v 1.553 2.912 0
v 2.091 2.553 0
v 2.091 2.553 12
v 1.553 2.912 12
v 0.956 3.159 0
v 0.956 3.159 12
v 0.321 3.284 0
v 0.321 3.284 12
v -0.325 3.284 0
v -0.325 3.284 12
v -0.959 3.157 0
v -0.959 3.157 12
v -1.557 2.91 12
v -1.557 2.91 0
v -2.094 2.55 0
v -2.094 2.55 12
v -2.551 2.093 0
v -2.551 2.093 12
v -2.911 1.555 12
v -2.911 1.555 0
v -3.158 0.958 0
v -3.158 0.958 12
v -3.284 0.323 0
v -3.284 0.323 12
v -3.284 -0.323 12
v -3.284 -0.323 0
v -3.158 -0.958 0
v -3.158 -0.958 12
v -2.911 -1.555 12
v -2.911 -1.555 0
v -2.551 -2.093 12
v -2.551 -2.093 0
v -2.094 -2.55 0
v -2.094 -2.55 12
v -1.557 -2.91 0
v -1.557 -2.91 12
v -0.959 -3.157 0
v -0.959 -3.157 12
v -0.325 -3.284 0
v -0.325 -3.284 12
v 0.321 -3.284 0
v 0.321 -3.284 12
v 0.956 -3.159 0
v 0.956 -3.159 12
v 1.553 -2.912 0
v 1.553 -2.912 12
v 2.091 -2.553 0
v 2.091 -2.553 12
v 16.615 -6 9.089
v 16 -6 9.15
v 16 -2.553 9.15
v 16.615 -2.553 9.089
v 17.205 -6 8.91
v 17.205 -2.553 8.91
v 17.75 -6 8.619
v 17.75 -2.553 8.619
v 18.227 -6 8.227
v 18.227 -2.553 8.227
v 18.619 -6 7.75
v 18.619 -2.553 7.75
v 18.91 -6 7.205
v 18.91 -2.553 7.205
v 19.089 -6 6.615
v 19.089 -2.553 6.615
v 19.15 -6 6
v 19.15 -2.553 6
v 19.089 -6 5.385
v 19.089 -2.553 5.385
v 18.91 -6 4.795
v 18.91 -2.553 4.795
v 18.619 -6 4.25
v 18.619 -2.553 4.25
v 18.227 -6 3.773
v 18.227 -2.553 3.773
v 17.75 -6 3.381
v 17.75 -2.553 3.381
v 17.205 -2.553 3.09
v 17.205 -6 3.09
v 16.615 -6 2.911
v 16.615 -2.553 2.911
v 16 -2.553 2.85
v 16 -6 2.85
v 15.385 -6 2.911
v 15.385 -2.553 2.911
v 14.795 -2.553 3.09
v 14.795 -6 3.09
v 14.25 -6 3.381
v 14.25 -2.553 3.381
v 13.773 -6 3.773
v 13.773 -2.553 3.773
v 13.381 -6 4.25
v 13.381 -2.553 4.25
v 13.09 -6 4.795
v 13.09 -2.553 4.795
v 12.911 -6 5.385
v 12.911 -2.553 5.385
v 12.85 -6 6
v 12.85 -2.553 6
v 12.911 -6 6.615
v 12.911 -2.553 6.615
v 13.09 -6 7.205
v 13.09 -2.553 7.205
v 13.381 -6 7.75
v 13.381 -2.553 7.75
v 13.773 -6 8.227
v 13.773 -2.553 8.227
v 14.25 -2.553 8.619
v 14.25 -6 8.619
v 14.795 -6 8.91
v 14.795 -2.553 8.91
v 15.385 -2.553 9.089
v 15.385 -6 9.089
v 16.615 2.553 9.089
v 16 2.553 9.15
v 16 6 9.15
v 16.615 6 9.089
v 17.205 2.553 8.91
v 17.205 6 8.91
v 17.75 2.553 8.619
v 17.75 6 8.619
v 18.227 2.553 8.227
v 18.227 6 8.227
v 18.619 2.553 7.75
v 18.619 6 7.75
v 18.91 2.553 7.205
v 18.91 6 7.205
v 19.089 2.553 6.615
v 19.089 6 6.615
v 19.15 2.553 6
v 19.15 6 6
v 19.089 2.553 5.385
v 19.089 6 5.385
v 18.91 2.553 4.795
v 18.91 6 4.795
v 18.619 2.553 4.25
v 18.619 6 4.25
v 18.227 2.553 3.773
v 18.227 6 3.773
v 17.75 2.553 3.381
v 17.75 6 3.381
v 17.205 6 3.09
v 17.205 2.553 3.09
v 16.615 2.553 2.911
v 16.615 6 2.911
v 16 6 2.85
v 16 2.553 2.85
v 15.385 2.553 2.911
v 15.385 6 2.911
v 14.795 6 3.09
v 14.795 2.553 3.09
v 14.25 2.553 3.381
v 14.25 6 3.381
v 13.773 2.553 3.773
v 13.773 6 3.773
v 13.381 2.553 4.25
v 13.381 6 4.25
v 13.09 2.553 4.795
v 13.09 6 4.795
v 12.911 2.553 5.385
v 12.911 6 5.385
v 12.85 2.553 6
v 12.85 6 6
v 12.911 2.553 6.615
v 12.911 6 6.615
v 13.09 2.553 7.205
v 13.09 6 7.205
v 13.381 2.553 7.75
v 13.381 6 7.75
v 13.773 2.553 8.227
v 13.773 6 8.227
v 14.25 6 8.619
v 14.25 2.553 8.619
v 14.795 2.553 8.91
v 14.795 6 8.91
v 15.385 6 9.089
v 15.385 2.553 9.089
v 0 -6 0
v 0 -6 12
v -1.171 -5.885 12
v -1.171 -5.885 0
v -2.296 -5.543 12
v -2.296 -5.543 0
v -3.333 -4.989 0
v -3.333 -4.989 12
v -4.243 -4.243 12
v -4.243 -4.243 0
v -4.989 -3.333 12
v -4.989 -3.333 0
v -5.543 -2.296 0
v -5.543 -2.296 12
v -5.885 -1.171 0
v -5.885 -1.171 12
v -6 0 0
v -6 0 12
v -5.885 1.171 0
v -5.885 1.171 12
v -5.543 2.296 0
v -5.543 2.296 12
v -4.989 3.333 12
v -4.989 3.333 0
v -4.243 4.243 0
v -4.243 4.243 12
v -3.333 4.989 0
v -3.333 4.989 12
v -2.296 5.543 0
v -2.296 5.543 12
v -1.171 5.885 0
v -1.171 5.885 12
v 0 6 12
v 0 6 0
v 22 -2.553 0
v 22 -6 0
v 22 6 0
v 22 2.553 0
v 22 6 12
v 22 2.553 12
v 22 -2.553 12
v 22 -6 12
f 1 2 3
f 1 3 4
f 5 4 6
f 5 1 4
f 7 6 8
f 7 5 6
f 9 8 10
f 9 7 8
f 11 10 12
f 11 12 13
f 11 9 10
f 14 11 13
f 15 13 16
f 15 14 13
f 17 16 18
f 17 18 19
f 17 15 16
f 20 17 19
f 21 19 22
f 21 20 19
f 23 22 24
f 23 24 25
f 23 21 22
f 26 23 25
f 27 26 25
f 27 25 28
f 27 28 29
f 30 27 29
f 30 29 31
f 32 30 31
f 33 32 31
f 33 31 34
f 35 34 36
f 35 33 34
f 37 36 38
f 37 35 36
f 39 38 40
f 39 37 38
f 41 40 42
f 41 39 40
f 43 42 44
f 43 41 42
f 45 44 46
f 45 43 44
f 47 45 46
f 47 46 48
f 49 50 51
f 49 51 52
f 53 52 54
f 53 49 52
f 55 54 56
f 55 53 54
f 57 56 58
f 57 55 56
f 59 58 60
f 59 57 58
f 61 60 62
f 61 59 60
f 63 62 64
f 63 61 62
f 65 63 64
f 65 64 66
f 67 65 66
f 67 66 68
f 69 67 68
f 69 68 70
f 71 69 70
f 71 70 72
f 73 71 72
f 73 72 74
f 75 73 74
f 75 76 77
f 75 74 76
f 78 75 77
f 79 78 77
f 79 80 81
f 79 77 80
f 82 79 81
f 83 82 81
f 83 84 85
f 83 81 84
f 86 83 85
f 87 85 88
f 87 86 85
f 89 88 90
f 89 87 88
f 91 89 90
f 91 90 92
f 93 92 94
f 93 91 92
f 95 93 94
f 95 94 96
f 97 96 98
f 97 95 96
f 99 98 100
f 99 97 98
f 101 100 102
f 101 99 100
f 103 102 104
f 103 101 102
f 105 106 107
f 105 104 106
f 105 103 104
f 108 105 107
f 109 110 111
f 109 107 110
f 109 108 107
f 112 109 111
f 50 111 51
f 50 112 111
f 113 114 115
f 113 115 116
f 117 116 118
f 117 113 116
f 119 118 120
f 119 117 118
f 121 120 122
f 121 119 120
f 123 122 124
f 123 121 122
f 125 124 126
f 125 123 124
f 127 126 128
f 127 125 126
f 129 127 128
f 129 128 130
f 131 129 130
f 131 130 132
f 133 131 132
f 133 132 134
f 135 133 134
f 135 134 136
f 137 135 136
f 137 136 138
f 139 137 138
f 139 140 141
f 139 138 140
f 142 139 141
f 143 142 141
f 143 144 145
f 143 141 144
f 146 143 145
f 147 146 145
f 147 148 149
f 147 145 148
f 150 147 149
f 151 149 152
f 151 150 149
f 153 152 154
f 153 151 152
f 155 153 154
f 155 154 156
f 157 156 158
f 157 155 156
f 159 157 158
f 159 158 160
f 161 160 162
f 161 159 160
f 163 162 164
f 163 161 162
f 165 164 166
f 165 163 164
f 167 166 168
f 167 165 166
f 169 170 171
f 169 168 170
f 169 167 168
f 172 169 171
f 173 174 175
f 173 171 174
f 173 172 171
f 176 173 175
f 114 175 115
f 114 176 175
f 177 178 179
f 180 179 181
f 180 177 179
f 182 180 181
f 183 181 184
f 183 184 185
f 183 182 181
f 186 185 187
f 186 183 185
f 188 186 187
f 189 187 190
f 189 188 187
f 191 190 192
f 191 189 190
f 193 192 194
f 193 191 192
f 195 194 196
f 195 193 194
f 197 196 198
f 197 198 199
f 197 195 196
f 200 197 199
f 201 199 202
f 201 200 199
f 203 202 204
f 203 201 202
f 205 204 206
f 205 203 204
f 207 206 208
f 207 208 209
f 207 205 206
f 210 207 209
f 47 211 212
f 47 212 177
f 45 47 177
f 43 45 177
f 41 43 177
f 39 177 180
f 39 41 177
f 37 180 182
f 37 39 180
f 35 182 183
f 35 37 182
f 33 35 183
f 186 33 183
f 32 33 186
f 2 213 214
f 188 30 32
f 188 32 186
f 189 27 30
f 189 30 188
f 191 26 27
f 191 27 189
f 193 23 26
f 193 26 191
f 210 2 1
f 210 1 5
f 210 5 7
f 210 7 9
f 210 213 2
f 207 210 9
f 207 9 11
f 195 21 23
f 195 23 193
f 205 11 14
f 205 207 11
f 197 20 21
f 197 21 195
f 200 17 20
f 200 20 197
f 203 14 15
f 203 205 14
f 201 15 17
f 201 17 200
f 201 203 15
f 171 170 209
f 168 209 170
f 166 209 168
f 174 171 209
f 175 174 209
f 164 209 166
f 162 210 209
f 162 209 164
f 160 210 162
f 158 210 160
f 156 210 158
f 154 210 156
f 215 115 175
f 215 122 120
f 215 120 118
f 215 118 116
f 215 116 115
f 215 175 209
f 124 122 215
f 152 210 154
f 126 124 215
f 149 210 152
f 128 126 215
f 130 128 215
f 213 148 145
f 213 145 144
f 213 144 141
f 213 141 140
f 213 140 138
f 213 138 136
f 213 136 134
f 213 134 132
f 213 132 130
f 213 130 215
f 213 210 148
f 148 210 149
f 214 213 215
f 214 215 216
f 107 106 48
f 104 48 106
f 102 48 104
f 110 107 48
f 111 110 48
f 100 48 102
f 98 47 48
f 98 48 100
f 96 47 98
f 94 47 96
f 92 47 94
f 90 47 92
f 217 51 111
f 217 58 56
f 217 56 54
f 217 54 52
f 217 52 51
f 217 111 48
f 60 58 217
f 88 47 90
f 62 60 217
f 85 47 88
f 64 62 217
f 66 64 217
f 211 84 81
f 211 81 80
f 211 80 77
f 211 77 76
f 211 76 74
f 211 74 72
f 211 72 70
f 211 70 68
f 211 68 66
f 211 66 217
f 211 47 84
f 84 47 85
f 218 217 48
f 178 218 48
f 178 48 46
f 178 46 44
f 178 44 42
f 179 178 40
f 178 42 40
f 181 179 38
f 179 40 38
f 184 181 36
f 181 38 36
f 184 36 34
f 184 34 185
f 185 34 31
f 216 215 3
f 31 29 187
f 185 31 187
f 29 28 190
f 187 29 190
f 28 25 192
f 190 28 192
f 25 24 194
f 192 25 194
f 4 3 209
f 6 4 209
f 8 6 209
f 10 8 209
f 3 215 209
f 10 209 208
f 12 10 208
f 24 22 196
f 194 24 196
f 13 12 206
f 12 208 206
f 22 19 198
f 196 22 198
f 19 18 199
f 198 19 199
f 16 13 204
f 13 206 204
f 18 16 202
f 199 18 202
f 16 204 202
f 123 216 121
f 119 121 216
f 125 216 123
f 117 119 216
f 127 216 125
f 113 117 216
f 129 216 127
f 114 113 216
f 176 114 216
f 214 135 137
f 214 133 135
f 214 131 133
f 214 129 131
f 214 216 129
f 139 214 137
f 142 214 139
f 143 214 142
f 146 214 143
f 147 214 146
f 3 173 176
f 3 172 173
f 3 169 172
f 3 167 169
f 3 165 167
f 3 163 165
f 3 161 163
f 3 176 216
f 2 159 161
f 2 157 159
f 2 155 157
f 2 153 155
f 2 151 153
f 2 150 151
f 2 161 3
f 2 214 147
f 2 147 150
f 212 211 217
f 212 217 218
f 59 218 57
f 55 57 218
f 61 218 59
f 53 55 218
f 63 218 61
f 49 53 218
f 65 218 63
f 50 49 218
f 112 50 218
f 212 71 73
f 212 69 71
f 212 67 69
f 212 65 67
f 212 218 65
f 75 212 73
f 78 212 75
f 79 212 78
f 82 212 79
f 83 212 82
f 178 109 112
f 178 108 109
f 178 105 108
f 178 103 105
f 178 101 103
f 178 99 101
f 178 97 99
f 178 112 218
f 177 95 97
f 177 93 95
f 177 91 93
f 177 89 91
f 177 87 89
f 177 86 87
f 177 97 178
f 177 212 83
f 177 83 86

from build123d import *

# Parameters (mm, degrees)
BOSS_EXTRUDE1_DEPTH     = 12
CUT_EXTRUDE1_DEPTH      = 26.768197453
CUT_EXTRUDE1_DEPTH_BACK = 26.768197453
SKETCH2_R               = 3.15


with BuildPart() as part:
    # Sketch1 → Boss-Extrude1 (new body)
    with BuildSketch(Plane.XY):
        with BuildLine():
            Line((0, 6), (22, 6))
            Line((22, 6), (22, 2.552710574))
            Line((22, 2.552710574), (2.091331807, 2.552710574))
            ThreePointArc((2.091331807, 2.552710574), (-3.3, 0), (2.091331807, -2.552710574))
            Line((2.091331807, -2.552710574), (22, -2.552710574))
            Line((22, -2.552710574), (22, -6))
            Line((22, -6), (0, -6))
            ThreePointArc((0, -6), (-6, 0), (0, 6))
        make_face()
    extrude(amount=BOSS_EXTRUDE1_DEPTH)

    # Sketch2 → Cut-Extrude1 (cut, two sides: drawn at the far end of the back side and taken through both)
    with BuildSketch(Plane(origin=(0, 0, 0), x_dir=(1, 0, 0), z_dir=(0, 1, 0)).offset(-CUT_EXTRUDE1_DEPTH_BACK)):
        with Locations(Location((16, -6, 0), (0, 0, 270))):
            Circle(SKETCH2_R)
    extrude(amount=CUT_EXTRUDE1_DEPTH + CUT_EXTRUDE1_DEPTH_BACK, mode=Mode.SUBTRACT)


solid = part.part
